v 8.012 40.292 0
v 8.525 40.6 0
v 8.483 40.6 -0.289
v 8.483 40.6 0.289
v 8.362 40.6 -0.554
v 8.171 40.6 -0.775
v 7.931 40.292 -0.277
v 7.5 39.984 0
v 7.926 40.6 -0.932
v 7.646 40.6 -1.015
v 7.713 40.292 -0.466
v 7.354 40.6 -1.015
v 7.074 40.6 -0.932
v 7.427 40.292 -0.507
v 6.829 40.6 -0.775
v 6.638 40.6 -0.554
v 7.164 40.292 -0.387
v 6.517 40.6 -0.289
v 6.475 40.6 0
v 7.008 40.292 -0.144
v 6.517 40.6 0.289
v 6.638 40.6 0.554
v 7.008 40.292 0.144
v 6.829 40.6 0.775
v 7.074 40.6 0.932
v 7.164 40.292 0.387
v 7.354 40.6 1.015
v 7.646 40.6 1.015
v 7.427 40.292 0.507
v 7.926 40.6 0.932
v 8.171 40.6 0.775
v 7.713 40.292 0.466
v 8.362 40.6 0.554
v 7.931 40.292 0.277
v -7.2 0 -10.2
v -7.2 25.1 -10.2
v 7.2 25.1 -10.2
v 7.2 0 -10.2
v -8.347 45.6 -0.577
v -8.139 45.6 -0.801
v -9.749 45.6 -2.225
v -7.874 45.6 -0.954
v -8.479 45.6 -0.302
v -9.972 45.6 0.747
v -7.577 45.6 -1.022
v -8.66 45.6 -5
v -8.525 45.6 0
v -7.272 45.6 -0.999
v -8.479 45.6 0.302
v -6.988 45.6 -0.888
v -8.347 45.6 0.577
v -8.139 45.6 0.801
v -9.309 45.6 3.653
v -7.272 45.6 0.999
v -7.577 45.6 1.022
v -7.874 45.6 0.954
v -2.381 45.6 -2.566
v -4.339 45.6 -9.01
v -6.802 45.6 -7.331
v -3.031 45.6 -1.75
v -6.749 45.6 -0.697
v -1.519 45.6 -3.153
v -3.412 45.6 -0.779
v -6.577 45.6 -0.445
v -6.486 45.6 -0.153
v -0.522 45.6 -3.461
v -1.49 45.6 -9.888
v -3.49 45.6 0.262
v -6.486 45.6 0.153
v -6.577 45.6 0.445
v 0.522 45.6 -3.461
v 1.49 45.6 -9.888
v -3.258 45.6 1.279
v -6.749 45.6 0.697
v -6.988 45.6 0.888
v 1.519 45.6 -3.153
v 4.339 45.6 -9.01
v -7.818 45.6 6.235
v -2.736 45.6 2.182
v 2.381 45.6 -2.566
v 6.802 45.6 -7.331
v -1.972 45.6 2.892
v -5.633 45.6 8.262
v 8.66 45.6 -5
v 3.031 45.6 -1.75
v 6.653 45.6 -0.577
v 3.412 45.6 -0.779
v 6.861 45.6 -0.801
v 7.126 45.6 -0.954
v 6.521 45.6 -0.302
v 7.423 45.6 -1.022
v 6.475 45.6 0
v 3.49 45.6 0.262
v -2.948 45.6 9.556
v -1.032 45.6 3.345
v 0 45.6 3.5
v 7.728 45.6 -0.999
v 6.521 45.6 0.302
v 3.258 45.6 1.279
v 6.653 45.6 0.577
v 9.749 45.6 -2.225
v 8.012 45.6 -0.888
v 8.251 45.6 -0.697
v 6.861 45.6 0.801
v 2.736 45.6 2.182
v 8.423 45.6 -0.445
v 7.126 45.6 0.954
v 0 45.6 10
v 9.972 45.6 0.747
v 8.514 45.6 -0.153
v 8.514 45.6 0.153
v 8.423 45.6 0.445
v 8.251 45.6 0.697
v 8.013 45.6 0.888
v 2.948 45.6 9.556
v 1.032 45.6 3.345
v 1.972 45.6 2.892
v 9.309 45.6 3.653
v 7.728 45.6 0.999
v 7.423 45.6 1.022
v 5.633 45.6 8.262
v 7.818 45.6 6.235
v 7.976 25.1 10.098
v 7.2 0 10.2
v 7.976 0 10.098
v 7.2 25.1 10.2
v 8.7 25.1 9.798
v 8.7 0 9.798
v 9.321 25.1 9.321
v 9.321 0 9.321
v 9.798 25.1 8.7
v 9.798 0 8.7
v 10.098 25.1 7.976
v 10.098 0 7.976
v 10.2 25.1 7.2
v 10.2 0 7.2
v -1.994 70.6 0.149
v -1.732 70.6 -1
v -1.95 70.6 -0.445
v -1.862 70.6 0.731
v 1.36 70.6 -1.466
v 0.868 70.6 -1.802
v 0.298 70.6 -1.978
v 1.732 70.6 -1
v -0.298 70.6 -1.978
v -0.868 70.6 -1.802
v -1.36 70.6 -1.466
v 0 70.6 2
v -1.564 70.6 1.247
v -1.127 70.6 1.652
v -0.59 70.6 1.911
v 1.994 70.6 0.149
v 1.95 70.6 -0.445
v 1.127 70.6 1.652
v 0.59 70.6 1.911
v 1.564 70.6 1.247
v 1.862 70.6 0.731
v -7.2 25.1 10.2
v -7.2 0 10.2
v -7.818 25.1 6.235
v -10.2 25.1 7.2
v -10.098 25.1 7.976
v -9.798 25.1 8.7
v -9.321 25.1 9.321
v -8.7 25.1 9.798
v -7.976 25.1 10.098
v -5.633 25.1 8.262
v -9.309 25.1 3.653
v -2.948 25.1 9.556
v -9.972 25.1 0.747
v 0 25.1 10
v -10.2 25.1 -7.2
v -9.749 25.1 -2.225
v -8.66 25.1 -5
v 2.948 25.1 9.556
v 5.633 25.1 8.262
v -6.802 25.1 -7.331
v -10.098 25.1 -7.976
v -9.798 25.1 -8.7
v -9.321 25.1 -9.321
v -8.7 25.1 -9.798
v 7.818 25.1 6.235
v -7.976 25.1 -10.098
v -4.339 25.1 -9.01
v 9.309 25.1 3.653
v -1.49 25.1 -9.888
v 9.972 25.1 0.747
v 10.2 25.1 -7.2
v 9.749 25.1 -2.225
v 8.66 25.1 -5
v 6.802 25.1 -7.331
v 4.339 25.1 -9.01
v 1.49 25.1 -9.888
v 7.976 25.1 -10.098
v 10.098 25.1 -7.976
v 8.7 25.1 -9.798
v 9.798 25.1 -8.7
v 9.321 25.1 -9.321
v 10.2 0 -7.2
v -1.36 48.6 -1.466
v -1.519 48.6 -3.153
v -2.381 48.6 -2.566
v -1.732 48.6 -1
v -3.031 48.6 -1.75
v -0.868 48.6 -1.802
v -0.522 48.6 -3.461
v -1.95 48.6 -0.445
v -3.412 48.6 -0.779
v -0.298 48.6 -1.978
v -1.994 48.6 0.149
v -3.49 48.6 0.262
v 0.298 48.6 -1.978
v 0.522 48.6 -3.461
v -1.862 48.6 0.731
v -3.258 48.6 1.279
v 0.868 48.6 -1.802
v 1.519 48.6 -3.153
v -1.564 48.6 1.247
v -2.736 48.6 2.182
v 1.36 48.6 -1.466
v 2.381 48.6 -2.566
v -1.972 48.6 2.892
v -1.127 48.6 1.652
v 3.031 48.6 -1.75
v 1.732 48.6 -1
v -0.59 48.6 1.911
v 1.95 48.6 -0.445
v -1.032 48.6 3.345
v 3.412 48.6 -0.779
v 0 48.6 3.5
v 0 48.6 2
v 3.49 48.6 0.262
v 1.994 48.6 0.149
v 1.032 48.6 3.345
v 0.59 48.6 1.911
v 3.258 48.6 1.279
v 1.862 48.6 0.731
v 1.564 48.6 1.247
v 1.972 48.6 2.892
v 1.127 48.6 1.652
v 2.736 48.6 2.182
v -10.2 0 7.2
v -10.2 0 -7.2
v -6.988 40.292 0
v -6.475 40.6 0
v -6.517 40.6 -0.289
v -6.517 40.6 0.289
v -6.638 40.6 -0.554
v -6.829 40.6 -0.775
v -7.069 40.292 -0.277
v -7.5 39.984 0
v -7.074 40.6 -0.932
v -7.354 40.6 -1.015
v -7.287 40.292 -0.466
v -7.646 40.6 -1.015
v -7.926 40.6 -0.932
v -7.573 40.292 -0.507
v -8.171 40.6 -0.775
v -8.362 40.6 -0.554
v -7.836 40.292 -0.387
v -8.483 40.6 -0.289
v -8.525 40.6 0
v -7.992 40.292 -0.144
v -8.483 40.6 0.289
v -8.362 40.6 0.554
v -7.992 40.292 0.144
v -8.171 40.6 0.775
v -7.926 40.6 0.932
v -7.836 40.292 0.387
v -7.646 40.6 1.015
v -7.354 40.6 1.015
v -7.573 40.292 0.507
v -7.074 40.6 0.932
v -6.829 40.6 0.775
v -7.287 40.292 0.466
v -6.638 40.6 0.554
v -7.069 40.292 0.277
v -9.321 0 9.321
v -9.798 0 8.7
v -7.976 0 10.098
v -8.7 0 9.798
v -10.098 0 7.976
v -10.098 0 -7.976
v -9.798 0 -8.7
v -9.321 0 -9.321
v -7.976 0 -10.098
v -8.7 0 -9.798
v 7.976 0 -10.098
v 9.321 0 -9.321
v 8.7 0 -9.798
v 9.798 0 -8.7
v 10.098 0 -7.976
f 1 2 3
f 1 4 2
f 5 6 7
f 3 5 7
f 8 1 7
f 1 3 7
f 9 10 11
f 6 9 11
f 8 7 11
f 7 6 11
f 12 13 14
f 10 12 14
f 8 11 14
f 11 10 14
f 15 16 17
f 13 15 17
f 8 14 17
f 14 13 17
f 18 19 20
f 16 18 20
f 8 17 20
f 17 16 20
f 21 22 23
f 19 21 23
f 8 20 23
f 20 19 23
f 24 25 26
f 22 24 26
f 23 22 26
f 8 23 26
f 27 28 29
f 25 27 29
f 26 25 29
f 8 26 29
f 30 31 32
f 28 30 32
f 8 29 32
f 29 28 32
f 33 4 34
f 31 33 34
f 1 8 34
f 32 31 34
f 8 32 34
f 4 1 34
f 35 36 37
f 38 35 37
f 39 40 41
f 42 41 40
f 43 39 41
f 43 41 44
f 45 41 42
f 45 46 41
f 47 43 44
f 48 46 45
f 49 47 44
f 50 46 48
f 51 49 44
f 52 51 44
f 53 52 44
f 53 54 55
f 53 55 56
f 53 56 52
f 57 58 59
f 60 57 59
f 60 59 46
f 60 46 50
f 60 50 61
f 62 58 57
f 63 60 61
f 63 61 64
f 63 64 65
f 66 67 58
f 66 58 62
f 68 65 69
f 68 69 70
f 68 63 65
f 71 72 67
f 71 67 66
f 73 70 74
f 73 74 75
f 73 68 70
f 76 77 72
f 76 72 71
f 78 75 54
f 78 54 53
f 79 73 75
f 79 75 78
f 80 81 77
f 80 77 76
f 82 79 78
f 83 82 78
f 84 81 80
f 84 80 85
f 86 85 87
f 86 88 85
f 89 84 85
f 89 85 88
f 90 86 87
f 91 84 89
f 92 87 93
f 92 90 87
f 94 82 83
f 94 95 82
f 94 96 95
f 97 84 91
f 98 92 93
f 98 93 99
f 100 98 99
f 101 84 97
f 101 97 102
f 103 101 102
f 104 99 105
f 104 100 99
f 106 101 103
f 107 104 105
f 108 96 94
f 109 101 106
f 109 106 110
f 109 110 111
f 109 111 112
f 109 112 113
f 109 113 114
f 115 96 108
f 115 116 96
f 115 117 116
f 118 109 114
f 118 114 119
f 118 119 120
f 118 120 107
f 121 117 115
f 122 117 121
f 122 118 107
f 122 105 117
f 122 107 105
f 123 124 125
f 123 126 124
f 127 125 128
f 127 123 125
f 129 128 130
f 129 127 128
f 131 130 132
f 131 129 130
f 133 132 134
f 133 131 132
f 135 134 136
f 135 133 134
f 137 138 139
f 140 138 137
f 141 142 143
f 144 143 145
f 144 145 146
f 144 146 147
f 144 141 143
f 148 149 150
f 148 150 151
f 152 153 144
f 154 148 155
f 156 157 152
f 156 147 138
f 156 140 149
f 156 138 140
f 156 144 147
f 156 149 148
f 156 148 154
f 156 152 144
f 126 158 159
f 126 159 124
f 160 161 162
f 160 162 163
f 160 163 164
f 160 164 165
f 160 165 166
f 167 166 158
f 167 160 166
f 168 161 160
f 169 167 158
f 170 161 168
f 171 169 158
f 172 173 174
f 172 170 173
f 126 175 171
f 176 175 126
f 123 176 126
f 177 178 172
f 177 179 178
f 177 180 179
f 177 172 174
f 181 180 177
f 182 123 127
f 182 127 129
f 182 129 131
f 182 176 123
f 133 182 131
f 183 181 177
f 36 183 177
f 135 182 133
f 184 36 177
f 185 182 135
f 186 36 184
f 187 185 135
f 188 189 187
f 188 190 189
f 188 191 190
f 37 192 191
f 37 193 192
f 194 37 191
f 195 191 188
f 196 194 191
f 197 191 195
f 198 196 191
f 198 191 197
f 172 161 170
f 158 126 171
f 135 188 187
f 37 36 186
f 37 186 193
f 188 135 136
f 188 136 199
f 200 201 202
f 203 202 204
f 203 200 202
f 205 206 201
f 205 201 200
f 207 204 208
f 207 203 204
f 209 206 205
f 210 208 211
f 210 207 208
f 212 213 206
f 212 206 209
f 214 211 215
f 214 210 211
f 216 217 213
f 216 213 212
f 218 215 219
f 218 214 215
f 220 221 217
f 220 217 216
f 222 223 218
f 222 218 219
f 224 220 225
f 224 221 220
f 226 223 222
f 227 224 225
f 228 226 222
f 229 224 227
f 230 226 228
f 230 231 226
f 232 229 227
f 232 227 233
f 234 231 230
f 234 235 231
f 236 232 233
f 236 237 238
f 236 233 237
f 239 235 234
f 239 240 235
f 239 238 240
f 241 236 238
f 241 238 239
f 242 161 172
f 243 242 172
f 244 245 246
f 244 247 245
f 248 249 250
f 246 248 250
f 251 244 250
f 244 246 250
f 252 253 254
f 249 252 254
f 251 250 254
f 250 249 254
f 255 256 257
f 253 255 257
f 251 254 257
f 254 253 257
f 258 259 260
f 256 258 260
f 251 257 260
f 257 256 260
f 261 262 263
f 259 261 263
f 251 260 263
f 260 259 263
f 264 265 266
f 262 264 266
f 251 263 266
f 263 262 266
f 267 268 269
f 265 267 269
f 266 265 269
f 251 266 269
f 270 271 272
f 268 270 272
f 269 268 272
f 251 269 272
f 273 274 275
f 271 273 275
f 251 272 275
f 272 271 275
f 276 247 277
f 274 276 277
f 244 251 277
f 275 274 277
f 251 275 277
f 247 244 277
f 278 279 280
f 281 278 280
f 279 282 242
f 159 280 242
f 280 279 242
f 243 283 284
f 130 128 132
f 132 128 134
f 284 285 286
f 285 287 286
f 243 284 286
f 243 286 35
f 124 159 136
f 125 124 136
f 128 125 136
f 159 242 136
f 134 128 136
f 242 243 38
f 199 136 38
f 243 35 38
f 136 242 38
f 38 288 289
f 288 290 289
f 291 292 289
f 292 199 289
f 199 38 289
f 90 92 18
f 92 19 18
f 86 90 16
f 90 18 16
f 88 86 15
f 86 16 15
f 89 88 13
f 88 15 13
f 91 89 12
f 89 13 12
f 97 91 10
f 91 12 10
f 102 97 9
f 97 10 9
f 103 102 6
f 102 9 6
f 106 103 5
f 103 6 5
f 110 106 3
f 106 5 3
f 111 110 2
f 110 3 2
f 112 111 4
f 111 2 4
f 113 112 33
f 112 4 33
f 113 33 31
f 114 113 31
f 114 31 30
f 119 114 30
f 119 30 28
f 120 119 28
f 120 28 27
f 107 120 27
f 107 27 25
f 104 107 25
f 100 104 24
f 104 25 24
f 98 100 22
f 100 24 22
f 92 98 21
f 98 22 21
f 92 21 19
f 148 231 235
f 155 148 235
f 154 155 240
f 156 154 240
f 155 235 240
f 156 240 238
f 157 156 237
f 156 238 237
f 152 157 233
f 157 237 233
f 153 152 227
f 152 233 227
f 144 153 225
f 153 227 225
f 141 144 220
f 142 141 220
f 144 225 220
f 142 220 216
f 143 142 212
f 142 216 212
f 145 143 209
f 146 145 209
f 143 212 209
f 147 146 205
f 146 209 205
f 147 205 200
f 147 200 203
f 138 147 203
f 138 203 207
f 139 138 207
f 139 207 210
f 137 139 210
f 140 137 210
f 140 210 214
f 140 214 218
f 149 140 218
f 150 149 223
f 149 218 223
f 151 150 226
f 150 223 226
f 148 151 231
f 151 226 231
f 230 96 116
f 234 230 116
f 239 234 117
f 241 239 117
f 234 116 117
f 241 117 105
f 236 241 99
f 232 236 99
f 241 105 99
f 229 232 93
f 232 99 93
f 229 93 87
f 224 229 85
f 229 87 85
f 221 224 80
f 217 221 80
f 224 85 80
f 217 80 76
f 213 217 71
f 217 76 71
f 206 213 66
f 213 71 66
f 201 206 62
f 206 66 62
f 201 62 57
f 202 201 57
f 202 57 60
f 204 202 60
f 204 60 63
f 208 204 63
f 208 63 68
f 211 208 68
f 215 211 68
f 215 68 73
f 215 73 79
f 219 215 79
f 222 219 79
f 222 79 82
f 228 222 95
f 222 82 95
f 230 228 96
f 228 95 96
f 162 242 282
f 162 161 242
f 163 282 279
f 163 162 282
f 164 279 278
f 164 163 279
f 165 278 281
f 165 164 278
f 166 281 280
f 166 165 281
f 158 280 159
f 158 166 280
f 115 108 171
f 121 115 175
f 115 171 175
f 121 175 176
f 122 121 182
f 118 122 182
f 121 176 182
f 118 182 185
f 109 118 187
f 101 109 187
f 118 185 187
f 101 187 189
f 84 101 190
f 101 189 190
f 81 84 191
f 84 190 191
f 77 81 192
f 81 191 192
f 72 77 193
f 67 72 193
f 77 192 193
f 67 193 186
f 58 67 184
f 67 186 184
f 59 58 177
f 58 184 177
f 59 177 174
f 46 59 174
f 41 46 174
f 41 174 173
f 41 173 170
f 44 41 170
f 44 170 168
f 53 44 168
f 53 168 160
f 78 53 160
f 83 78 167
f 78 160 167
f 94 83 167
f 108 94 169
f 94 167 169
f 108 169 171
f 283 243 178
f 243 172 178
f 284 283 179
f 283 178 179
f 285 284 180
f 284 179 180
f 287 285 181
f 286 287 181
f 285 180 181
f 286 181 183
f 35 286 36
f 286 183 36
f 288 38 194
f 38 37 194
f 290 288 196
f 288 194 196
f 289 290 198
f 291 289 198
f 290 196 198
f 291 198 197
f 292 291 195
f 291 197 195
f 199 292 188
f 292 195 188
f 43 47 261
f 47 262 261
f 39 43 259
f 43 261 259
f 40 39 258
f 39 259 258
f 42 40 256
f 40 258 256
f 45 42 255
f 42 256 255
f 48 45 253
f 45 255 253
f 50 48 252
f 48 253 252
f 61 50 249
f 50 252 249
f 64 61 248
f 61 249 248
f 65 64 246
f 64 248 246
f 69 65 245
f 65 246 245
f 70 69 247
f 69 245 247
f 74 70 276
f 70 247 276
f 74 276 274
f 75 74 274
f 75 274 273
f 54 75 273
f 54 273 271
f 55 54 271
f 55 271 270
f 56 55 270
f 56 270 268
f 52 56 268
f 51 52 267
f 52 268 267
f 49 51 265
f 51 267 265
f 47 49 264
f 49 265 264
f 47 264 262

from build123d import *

# Parameters (mm, degrees)
SKETCH2_W               = 20.4
SKETCH2_H               = 20.4
BOSS_EXTRUDE1_DEPTH     = 25.1
SKETCH3_R               = 10
BOSS_EXTRUDE2_DEPTH     = 20.5
SKETCH4_R               = 3.5
BOSS_EXTRUDE3_DEPTH     = 3
SKETCH5_R               = 2
BOSS_EXTRUDE4_DEPTH     = 22
M2_5_TAPPED_HOLE1_D     = 2.05
M2_5_TAPPED_HOLE1_DEPTH = 5
M2_5_TAPPED_HOLE1_TIP   = 0.615882135
FILLET1_R               = 3


with BuildPart() as part:
    # Sketch2 → Boss-Extrude1 (new body)
    with BuildSketch(Plane(origin=(0, 0, 0), x_dir=(1, 0, 0), z_dir=(0, 1, 0))):
        Rectangle(SKETCH2_W, SKETCH2_H)
    extrude(amount=BOSS_EXTRUDE1_DEPTH)

    # Sketch3 → Boss-Extrude2 (add)
    with BuildSketch(Plane(origin=(0, 25.1, 0), x_dir=(1, 0, 0), z_dir=(0, 1, 0))):
        with Locations(Location((0, 0, 0), (0, 0, 270))):
            Circle(SKETCH3_R)
    extrude(amount=BOSS_EXTRUDE2_DEPTH)

    # Sketch4 → Boss-Extrude3 (add)
    with BuildSketch(Plane(origin=(0, 45.6, 0), x_dir=(1, 0, 0), z_dir=(0, 1, 0))):
        with Locations(Location((0, 0, 0), (0, 0, 270))):
            Circle(SKETCH4_R)
    extrude(amount=BOSS_EXTRUDE3_DEPTH)

    # Sketch5 → Boss-Extrude4 (add)
    with BuildSketch(Plane(origin=(0, 48.6, 0), x_dir=(1, 0, 0), z_dir=(0, 1, 0))):
        with Locations(Location((0, 0, 0), (0, 0, 270))):
            Circle(SKETCH5_R)
    extrude(amount=BOSS_EXTRUDE4_DEPTH)

    # M2.5 Tapped Hole1
    with Locations(Plane(origin=(0, 45.6, 0), x_dir=(1, 0, 0), z_dir=(0, 1, 0))):
        with Locations((-7.5, 0), (7.5, 0)):
            Hole(M2_5_TAPPED_HOLE1_D / 2, depth=M2_5_TAPPED_HOLE1_DEPTH)
            with Locations((0, 0, -(M2_5_TAPPED_HOLE1_DEPTH + M2_5_TAPPED_HOLE1_TIP / 2))):  # 118° drill point
                Cone(0, M2_5_TAPPED_HOLE1_D / 2, M2_5_TAPPED_HOLE1_TIP, mode=Mode.SUBTRACT)

    # Fillet1
    fillet1_edges = [part.edges().sort_by_distance(p)[0] for p in [
        (10.2, 12.55, 10.2),
        (-10.2, 12.55, 10.2),
        (-10.2, 12.55, -10.2),
        (10.2, 12.55, -10.2),
    ]]
    fillet(fillet1_edges, radius=FILLET1_R)


solid = part.part
